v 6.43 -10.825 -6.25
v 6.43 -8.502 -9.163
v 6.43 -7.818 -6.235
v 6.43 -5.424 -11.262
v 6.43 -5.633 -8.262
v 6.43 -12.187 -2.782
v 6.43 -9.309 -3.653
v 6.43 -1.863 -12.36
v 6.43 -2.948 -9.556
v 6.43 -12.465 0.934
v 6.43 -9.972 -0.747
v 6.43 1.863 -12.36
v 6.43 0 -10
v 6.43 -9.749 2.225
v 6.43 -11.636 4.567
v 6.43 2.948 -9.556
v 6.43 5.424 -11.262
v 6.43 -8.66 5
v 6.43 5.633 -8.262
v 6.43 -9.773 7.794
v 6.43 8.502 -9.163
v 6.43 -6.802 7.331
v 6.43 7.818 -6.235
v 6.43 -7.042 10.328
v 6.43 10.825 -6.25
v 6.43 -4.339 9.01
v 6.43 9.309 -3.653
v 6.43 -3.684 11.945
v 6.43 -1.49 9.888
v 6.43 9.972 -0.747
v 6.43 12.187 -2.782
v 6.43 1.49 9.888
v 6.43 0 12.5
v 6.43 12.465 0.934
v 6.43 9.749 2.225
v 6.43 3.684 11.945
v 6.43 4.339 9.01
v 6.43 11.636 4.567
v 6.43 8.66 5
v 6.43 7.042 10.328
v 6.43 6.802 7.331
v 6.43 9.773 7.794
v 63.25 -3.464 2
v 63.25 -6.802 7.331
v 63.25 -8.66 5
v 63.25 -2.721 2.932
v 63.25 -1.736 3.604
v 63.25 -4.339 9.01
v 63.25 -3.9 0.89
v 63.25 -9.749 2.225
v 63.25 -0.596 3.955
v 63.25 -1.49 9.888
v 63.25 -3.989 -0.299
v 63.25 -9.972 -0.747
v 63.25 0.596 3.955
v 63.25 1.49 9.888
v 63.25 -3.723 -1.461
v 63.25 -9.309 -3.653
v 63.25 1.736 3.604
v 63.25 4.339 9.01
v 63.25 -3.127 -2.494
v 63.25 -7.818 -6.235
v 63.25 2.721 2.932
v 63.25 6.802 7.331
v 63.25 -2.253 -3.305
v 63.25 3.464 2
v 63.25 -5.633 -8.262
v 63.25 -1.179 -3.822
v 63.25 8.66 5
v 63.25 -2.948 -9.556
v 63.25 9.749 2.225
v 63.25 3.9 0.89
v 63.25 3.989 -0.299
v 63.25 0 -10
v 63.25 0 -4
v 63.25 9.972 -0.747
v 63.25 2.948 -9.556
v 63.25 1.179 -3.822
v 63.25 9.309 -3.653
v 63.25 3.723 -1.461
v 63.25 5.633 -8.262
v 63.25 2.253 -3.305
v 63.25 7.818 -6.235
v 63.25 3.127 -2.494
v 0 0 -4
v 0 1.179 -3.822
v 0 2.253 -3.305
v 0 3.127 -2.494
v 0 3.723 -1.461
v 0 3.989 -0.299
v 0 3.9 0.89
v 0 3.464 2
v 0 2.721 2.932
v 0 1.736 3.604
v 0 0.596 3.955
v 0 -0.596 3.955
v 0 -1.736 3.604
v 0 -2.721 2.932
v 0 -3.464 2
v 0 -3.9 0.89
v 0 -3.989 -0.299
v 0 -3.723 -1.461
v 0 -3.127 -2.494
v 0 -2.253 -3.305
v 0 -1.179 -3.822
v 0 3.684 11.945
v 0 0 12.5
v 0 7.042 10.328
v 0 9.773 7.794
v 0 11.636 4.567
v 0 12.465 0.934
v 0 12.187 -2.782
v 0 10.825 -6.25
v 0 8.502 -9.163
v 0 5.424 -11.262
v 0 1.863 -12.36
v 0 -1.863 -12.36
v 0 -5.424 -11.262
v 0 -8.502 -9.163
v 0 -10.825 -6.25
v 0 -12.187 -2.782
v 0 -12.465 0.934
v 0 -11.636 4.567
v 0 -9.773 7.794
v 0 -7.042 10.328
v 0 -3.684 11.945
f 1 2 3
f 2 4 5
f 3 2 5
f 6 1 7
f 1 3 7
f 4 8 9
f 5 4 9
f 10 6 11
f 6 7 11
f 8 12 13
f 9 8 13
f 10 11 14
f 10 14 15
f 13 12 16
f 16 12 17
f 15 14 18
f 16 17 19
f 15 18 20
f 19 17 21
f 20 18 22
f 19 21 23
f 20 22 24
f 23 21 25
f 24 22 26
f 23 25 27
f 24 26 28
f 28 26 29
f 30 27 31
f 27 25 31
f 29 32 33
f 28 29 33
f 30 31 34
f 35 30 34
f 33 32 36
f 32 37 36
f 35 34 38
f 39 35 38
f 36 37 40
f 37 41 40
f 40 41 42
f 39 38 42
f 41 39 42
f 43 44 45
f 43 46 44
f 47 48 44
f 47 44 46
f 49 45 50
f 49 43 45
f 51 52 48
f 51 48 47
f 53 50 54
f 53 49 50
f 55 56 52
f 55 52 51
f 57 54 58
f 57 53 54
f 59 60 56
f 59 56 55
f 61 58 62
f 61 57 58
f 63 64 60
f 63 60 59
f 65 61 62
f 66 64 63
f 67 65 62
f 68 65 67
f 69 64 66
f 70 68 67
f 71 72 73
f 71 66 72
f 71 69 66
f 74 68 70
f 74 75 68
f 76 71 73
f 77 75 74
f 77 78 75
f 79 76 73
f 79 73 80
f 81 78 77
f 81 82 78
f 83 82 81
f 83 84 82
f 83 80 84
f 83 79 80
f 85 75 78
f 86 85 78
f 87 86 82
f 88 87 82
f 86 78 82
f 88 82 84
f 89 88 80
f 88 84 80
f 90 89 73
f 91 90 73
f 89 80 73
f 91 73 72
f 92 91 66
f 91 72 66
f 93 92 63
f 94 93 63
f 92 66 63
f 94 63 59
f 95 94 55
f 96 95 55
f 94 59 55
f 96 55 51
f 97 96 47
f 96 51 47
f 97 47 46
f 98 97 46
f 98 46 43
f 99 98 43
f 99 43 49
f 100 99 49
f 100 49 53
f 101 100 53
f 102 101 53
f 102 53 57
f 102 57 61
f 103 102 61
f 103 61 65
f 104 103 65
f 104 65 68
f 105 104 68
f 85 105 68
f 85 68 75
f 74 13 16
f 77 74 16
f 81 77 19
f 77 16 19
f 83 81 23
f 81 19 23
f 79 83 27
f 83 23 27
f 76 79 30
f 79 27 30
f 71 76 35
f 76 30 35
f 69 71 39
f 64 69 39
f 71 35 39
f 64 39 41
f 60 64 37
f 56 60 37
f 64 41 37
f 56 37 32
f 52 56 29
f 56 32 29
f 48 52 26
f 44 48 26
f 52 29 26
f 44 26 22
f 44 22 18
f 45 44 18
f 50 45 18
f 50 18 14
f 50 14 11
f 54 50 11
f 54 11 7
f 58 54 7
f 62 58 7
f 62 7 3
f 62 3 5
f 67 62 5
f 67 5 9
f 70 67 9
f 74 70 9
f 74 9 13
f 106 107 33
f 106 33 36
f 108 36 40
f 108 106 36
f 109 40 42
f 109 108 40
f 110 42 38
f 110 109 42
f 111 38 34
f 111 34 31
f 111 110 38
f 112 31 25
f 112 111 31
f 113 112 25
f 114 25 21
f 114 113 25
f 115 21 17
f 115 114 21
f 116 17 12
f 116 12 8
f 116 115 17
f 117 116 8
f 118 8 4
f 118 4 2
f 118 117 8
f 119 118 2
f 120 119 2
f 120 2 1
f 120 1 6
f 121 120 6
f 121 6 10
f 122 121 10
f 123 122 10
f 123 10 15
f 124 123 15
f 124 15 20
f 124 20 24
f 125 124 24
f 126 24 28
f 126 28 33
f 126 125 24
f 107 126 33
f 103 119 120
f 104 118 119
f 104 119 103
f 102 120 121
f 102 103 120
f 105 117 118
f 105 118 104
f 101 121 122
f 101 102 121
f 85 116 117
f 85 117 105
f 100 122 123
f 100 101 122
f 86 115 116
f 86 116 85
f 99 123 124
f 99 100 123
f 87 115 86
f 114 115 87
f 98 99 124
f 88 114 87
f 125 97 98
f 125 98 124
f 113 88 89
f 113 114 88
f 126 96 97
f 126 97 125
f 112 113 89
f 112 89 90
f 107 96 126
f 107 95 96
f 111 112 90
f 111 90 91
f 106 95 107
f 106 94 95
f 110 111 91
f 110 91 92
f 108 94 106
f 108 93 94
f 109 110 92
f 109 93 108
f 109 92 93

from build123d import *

# Parameters (mm, degrees)
SKETCH1_R           = 10
BOSS_EXTRUDE1_DEPTH = 63.25
SKETCH2_R           = 12.5
BOSS_EXTRUDE2_DEPTH = 6.43
SKETCH3_R           = 4
CUT_EXTRUDE1_DEPTH  = 66.673910345


with BuildPart() as part:
    # Sketch1 → Boss-Extrude1 (new body)
    with BuildSketch(Plane(origin=(0, 0, 0), x_dir=(0, 0, -1), z_dir=(1, 0, 0))):
        Circle(SKETCH1_R)
    extrude(amount=BOSS_EXTRUDE1_DEPTH)

    # Sketch2 → Boss-Extrude2 (add)
    with BuildSketch(Plane.ZY):
        Circle(SKETCH2_R)
    extrude(amount=-BOSS_EXTRUDE2_DEPTH)

    # Sketch3 → Cut-Extrude1 (cut, through all)
    with BuildSketch(Plane(origin=(63.25, 0, 0), x_dir=(0, 0, -1), z_dir=(1, 0, 0))):
        Circle(SKETCH3_R)
    extrude(amount=-CUT_EXTRUDE1_DEPTH, mode=Mode.SUBTRACT)


solid = part.part
